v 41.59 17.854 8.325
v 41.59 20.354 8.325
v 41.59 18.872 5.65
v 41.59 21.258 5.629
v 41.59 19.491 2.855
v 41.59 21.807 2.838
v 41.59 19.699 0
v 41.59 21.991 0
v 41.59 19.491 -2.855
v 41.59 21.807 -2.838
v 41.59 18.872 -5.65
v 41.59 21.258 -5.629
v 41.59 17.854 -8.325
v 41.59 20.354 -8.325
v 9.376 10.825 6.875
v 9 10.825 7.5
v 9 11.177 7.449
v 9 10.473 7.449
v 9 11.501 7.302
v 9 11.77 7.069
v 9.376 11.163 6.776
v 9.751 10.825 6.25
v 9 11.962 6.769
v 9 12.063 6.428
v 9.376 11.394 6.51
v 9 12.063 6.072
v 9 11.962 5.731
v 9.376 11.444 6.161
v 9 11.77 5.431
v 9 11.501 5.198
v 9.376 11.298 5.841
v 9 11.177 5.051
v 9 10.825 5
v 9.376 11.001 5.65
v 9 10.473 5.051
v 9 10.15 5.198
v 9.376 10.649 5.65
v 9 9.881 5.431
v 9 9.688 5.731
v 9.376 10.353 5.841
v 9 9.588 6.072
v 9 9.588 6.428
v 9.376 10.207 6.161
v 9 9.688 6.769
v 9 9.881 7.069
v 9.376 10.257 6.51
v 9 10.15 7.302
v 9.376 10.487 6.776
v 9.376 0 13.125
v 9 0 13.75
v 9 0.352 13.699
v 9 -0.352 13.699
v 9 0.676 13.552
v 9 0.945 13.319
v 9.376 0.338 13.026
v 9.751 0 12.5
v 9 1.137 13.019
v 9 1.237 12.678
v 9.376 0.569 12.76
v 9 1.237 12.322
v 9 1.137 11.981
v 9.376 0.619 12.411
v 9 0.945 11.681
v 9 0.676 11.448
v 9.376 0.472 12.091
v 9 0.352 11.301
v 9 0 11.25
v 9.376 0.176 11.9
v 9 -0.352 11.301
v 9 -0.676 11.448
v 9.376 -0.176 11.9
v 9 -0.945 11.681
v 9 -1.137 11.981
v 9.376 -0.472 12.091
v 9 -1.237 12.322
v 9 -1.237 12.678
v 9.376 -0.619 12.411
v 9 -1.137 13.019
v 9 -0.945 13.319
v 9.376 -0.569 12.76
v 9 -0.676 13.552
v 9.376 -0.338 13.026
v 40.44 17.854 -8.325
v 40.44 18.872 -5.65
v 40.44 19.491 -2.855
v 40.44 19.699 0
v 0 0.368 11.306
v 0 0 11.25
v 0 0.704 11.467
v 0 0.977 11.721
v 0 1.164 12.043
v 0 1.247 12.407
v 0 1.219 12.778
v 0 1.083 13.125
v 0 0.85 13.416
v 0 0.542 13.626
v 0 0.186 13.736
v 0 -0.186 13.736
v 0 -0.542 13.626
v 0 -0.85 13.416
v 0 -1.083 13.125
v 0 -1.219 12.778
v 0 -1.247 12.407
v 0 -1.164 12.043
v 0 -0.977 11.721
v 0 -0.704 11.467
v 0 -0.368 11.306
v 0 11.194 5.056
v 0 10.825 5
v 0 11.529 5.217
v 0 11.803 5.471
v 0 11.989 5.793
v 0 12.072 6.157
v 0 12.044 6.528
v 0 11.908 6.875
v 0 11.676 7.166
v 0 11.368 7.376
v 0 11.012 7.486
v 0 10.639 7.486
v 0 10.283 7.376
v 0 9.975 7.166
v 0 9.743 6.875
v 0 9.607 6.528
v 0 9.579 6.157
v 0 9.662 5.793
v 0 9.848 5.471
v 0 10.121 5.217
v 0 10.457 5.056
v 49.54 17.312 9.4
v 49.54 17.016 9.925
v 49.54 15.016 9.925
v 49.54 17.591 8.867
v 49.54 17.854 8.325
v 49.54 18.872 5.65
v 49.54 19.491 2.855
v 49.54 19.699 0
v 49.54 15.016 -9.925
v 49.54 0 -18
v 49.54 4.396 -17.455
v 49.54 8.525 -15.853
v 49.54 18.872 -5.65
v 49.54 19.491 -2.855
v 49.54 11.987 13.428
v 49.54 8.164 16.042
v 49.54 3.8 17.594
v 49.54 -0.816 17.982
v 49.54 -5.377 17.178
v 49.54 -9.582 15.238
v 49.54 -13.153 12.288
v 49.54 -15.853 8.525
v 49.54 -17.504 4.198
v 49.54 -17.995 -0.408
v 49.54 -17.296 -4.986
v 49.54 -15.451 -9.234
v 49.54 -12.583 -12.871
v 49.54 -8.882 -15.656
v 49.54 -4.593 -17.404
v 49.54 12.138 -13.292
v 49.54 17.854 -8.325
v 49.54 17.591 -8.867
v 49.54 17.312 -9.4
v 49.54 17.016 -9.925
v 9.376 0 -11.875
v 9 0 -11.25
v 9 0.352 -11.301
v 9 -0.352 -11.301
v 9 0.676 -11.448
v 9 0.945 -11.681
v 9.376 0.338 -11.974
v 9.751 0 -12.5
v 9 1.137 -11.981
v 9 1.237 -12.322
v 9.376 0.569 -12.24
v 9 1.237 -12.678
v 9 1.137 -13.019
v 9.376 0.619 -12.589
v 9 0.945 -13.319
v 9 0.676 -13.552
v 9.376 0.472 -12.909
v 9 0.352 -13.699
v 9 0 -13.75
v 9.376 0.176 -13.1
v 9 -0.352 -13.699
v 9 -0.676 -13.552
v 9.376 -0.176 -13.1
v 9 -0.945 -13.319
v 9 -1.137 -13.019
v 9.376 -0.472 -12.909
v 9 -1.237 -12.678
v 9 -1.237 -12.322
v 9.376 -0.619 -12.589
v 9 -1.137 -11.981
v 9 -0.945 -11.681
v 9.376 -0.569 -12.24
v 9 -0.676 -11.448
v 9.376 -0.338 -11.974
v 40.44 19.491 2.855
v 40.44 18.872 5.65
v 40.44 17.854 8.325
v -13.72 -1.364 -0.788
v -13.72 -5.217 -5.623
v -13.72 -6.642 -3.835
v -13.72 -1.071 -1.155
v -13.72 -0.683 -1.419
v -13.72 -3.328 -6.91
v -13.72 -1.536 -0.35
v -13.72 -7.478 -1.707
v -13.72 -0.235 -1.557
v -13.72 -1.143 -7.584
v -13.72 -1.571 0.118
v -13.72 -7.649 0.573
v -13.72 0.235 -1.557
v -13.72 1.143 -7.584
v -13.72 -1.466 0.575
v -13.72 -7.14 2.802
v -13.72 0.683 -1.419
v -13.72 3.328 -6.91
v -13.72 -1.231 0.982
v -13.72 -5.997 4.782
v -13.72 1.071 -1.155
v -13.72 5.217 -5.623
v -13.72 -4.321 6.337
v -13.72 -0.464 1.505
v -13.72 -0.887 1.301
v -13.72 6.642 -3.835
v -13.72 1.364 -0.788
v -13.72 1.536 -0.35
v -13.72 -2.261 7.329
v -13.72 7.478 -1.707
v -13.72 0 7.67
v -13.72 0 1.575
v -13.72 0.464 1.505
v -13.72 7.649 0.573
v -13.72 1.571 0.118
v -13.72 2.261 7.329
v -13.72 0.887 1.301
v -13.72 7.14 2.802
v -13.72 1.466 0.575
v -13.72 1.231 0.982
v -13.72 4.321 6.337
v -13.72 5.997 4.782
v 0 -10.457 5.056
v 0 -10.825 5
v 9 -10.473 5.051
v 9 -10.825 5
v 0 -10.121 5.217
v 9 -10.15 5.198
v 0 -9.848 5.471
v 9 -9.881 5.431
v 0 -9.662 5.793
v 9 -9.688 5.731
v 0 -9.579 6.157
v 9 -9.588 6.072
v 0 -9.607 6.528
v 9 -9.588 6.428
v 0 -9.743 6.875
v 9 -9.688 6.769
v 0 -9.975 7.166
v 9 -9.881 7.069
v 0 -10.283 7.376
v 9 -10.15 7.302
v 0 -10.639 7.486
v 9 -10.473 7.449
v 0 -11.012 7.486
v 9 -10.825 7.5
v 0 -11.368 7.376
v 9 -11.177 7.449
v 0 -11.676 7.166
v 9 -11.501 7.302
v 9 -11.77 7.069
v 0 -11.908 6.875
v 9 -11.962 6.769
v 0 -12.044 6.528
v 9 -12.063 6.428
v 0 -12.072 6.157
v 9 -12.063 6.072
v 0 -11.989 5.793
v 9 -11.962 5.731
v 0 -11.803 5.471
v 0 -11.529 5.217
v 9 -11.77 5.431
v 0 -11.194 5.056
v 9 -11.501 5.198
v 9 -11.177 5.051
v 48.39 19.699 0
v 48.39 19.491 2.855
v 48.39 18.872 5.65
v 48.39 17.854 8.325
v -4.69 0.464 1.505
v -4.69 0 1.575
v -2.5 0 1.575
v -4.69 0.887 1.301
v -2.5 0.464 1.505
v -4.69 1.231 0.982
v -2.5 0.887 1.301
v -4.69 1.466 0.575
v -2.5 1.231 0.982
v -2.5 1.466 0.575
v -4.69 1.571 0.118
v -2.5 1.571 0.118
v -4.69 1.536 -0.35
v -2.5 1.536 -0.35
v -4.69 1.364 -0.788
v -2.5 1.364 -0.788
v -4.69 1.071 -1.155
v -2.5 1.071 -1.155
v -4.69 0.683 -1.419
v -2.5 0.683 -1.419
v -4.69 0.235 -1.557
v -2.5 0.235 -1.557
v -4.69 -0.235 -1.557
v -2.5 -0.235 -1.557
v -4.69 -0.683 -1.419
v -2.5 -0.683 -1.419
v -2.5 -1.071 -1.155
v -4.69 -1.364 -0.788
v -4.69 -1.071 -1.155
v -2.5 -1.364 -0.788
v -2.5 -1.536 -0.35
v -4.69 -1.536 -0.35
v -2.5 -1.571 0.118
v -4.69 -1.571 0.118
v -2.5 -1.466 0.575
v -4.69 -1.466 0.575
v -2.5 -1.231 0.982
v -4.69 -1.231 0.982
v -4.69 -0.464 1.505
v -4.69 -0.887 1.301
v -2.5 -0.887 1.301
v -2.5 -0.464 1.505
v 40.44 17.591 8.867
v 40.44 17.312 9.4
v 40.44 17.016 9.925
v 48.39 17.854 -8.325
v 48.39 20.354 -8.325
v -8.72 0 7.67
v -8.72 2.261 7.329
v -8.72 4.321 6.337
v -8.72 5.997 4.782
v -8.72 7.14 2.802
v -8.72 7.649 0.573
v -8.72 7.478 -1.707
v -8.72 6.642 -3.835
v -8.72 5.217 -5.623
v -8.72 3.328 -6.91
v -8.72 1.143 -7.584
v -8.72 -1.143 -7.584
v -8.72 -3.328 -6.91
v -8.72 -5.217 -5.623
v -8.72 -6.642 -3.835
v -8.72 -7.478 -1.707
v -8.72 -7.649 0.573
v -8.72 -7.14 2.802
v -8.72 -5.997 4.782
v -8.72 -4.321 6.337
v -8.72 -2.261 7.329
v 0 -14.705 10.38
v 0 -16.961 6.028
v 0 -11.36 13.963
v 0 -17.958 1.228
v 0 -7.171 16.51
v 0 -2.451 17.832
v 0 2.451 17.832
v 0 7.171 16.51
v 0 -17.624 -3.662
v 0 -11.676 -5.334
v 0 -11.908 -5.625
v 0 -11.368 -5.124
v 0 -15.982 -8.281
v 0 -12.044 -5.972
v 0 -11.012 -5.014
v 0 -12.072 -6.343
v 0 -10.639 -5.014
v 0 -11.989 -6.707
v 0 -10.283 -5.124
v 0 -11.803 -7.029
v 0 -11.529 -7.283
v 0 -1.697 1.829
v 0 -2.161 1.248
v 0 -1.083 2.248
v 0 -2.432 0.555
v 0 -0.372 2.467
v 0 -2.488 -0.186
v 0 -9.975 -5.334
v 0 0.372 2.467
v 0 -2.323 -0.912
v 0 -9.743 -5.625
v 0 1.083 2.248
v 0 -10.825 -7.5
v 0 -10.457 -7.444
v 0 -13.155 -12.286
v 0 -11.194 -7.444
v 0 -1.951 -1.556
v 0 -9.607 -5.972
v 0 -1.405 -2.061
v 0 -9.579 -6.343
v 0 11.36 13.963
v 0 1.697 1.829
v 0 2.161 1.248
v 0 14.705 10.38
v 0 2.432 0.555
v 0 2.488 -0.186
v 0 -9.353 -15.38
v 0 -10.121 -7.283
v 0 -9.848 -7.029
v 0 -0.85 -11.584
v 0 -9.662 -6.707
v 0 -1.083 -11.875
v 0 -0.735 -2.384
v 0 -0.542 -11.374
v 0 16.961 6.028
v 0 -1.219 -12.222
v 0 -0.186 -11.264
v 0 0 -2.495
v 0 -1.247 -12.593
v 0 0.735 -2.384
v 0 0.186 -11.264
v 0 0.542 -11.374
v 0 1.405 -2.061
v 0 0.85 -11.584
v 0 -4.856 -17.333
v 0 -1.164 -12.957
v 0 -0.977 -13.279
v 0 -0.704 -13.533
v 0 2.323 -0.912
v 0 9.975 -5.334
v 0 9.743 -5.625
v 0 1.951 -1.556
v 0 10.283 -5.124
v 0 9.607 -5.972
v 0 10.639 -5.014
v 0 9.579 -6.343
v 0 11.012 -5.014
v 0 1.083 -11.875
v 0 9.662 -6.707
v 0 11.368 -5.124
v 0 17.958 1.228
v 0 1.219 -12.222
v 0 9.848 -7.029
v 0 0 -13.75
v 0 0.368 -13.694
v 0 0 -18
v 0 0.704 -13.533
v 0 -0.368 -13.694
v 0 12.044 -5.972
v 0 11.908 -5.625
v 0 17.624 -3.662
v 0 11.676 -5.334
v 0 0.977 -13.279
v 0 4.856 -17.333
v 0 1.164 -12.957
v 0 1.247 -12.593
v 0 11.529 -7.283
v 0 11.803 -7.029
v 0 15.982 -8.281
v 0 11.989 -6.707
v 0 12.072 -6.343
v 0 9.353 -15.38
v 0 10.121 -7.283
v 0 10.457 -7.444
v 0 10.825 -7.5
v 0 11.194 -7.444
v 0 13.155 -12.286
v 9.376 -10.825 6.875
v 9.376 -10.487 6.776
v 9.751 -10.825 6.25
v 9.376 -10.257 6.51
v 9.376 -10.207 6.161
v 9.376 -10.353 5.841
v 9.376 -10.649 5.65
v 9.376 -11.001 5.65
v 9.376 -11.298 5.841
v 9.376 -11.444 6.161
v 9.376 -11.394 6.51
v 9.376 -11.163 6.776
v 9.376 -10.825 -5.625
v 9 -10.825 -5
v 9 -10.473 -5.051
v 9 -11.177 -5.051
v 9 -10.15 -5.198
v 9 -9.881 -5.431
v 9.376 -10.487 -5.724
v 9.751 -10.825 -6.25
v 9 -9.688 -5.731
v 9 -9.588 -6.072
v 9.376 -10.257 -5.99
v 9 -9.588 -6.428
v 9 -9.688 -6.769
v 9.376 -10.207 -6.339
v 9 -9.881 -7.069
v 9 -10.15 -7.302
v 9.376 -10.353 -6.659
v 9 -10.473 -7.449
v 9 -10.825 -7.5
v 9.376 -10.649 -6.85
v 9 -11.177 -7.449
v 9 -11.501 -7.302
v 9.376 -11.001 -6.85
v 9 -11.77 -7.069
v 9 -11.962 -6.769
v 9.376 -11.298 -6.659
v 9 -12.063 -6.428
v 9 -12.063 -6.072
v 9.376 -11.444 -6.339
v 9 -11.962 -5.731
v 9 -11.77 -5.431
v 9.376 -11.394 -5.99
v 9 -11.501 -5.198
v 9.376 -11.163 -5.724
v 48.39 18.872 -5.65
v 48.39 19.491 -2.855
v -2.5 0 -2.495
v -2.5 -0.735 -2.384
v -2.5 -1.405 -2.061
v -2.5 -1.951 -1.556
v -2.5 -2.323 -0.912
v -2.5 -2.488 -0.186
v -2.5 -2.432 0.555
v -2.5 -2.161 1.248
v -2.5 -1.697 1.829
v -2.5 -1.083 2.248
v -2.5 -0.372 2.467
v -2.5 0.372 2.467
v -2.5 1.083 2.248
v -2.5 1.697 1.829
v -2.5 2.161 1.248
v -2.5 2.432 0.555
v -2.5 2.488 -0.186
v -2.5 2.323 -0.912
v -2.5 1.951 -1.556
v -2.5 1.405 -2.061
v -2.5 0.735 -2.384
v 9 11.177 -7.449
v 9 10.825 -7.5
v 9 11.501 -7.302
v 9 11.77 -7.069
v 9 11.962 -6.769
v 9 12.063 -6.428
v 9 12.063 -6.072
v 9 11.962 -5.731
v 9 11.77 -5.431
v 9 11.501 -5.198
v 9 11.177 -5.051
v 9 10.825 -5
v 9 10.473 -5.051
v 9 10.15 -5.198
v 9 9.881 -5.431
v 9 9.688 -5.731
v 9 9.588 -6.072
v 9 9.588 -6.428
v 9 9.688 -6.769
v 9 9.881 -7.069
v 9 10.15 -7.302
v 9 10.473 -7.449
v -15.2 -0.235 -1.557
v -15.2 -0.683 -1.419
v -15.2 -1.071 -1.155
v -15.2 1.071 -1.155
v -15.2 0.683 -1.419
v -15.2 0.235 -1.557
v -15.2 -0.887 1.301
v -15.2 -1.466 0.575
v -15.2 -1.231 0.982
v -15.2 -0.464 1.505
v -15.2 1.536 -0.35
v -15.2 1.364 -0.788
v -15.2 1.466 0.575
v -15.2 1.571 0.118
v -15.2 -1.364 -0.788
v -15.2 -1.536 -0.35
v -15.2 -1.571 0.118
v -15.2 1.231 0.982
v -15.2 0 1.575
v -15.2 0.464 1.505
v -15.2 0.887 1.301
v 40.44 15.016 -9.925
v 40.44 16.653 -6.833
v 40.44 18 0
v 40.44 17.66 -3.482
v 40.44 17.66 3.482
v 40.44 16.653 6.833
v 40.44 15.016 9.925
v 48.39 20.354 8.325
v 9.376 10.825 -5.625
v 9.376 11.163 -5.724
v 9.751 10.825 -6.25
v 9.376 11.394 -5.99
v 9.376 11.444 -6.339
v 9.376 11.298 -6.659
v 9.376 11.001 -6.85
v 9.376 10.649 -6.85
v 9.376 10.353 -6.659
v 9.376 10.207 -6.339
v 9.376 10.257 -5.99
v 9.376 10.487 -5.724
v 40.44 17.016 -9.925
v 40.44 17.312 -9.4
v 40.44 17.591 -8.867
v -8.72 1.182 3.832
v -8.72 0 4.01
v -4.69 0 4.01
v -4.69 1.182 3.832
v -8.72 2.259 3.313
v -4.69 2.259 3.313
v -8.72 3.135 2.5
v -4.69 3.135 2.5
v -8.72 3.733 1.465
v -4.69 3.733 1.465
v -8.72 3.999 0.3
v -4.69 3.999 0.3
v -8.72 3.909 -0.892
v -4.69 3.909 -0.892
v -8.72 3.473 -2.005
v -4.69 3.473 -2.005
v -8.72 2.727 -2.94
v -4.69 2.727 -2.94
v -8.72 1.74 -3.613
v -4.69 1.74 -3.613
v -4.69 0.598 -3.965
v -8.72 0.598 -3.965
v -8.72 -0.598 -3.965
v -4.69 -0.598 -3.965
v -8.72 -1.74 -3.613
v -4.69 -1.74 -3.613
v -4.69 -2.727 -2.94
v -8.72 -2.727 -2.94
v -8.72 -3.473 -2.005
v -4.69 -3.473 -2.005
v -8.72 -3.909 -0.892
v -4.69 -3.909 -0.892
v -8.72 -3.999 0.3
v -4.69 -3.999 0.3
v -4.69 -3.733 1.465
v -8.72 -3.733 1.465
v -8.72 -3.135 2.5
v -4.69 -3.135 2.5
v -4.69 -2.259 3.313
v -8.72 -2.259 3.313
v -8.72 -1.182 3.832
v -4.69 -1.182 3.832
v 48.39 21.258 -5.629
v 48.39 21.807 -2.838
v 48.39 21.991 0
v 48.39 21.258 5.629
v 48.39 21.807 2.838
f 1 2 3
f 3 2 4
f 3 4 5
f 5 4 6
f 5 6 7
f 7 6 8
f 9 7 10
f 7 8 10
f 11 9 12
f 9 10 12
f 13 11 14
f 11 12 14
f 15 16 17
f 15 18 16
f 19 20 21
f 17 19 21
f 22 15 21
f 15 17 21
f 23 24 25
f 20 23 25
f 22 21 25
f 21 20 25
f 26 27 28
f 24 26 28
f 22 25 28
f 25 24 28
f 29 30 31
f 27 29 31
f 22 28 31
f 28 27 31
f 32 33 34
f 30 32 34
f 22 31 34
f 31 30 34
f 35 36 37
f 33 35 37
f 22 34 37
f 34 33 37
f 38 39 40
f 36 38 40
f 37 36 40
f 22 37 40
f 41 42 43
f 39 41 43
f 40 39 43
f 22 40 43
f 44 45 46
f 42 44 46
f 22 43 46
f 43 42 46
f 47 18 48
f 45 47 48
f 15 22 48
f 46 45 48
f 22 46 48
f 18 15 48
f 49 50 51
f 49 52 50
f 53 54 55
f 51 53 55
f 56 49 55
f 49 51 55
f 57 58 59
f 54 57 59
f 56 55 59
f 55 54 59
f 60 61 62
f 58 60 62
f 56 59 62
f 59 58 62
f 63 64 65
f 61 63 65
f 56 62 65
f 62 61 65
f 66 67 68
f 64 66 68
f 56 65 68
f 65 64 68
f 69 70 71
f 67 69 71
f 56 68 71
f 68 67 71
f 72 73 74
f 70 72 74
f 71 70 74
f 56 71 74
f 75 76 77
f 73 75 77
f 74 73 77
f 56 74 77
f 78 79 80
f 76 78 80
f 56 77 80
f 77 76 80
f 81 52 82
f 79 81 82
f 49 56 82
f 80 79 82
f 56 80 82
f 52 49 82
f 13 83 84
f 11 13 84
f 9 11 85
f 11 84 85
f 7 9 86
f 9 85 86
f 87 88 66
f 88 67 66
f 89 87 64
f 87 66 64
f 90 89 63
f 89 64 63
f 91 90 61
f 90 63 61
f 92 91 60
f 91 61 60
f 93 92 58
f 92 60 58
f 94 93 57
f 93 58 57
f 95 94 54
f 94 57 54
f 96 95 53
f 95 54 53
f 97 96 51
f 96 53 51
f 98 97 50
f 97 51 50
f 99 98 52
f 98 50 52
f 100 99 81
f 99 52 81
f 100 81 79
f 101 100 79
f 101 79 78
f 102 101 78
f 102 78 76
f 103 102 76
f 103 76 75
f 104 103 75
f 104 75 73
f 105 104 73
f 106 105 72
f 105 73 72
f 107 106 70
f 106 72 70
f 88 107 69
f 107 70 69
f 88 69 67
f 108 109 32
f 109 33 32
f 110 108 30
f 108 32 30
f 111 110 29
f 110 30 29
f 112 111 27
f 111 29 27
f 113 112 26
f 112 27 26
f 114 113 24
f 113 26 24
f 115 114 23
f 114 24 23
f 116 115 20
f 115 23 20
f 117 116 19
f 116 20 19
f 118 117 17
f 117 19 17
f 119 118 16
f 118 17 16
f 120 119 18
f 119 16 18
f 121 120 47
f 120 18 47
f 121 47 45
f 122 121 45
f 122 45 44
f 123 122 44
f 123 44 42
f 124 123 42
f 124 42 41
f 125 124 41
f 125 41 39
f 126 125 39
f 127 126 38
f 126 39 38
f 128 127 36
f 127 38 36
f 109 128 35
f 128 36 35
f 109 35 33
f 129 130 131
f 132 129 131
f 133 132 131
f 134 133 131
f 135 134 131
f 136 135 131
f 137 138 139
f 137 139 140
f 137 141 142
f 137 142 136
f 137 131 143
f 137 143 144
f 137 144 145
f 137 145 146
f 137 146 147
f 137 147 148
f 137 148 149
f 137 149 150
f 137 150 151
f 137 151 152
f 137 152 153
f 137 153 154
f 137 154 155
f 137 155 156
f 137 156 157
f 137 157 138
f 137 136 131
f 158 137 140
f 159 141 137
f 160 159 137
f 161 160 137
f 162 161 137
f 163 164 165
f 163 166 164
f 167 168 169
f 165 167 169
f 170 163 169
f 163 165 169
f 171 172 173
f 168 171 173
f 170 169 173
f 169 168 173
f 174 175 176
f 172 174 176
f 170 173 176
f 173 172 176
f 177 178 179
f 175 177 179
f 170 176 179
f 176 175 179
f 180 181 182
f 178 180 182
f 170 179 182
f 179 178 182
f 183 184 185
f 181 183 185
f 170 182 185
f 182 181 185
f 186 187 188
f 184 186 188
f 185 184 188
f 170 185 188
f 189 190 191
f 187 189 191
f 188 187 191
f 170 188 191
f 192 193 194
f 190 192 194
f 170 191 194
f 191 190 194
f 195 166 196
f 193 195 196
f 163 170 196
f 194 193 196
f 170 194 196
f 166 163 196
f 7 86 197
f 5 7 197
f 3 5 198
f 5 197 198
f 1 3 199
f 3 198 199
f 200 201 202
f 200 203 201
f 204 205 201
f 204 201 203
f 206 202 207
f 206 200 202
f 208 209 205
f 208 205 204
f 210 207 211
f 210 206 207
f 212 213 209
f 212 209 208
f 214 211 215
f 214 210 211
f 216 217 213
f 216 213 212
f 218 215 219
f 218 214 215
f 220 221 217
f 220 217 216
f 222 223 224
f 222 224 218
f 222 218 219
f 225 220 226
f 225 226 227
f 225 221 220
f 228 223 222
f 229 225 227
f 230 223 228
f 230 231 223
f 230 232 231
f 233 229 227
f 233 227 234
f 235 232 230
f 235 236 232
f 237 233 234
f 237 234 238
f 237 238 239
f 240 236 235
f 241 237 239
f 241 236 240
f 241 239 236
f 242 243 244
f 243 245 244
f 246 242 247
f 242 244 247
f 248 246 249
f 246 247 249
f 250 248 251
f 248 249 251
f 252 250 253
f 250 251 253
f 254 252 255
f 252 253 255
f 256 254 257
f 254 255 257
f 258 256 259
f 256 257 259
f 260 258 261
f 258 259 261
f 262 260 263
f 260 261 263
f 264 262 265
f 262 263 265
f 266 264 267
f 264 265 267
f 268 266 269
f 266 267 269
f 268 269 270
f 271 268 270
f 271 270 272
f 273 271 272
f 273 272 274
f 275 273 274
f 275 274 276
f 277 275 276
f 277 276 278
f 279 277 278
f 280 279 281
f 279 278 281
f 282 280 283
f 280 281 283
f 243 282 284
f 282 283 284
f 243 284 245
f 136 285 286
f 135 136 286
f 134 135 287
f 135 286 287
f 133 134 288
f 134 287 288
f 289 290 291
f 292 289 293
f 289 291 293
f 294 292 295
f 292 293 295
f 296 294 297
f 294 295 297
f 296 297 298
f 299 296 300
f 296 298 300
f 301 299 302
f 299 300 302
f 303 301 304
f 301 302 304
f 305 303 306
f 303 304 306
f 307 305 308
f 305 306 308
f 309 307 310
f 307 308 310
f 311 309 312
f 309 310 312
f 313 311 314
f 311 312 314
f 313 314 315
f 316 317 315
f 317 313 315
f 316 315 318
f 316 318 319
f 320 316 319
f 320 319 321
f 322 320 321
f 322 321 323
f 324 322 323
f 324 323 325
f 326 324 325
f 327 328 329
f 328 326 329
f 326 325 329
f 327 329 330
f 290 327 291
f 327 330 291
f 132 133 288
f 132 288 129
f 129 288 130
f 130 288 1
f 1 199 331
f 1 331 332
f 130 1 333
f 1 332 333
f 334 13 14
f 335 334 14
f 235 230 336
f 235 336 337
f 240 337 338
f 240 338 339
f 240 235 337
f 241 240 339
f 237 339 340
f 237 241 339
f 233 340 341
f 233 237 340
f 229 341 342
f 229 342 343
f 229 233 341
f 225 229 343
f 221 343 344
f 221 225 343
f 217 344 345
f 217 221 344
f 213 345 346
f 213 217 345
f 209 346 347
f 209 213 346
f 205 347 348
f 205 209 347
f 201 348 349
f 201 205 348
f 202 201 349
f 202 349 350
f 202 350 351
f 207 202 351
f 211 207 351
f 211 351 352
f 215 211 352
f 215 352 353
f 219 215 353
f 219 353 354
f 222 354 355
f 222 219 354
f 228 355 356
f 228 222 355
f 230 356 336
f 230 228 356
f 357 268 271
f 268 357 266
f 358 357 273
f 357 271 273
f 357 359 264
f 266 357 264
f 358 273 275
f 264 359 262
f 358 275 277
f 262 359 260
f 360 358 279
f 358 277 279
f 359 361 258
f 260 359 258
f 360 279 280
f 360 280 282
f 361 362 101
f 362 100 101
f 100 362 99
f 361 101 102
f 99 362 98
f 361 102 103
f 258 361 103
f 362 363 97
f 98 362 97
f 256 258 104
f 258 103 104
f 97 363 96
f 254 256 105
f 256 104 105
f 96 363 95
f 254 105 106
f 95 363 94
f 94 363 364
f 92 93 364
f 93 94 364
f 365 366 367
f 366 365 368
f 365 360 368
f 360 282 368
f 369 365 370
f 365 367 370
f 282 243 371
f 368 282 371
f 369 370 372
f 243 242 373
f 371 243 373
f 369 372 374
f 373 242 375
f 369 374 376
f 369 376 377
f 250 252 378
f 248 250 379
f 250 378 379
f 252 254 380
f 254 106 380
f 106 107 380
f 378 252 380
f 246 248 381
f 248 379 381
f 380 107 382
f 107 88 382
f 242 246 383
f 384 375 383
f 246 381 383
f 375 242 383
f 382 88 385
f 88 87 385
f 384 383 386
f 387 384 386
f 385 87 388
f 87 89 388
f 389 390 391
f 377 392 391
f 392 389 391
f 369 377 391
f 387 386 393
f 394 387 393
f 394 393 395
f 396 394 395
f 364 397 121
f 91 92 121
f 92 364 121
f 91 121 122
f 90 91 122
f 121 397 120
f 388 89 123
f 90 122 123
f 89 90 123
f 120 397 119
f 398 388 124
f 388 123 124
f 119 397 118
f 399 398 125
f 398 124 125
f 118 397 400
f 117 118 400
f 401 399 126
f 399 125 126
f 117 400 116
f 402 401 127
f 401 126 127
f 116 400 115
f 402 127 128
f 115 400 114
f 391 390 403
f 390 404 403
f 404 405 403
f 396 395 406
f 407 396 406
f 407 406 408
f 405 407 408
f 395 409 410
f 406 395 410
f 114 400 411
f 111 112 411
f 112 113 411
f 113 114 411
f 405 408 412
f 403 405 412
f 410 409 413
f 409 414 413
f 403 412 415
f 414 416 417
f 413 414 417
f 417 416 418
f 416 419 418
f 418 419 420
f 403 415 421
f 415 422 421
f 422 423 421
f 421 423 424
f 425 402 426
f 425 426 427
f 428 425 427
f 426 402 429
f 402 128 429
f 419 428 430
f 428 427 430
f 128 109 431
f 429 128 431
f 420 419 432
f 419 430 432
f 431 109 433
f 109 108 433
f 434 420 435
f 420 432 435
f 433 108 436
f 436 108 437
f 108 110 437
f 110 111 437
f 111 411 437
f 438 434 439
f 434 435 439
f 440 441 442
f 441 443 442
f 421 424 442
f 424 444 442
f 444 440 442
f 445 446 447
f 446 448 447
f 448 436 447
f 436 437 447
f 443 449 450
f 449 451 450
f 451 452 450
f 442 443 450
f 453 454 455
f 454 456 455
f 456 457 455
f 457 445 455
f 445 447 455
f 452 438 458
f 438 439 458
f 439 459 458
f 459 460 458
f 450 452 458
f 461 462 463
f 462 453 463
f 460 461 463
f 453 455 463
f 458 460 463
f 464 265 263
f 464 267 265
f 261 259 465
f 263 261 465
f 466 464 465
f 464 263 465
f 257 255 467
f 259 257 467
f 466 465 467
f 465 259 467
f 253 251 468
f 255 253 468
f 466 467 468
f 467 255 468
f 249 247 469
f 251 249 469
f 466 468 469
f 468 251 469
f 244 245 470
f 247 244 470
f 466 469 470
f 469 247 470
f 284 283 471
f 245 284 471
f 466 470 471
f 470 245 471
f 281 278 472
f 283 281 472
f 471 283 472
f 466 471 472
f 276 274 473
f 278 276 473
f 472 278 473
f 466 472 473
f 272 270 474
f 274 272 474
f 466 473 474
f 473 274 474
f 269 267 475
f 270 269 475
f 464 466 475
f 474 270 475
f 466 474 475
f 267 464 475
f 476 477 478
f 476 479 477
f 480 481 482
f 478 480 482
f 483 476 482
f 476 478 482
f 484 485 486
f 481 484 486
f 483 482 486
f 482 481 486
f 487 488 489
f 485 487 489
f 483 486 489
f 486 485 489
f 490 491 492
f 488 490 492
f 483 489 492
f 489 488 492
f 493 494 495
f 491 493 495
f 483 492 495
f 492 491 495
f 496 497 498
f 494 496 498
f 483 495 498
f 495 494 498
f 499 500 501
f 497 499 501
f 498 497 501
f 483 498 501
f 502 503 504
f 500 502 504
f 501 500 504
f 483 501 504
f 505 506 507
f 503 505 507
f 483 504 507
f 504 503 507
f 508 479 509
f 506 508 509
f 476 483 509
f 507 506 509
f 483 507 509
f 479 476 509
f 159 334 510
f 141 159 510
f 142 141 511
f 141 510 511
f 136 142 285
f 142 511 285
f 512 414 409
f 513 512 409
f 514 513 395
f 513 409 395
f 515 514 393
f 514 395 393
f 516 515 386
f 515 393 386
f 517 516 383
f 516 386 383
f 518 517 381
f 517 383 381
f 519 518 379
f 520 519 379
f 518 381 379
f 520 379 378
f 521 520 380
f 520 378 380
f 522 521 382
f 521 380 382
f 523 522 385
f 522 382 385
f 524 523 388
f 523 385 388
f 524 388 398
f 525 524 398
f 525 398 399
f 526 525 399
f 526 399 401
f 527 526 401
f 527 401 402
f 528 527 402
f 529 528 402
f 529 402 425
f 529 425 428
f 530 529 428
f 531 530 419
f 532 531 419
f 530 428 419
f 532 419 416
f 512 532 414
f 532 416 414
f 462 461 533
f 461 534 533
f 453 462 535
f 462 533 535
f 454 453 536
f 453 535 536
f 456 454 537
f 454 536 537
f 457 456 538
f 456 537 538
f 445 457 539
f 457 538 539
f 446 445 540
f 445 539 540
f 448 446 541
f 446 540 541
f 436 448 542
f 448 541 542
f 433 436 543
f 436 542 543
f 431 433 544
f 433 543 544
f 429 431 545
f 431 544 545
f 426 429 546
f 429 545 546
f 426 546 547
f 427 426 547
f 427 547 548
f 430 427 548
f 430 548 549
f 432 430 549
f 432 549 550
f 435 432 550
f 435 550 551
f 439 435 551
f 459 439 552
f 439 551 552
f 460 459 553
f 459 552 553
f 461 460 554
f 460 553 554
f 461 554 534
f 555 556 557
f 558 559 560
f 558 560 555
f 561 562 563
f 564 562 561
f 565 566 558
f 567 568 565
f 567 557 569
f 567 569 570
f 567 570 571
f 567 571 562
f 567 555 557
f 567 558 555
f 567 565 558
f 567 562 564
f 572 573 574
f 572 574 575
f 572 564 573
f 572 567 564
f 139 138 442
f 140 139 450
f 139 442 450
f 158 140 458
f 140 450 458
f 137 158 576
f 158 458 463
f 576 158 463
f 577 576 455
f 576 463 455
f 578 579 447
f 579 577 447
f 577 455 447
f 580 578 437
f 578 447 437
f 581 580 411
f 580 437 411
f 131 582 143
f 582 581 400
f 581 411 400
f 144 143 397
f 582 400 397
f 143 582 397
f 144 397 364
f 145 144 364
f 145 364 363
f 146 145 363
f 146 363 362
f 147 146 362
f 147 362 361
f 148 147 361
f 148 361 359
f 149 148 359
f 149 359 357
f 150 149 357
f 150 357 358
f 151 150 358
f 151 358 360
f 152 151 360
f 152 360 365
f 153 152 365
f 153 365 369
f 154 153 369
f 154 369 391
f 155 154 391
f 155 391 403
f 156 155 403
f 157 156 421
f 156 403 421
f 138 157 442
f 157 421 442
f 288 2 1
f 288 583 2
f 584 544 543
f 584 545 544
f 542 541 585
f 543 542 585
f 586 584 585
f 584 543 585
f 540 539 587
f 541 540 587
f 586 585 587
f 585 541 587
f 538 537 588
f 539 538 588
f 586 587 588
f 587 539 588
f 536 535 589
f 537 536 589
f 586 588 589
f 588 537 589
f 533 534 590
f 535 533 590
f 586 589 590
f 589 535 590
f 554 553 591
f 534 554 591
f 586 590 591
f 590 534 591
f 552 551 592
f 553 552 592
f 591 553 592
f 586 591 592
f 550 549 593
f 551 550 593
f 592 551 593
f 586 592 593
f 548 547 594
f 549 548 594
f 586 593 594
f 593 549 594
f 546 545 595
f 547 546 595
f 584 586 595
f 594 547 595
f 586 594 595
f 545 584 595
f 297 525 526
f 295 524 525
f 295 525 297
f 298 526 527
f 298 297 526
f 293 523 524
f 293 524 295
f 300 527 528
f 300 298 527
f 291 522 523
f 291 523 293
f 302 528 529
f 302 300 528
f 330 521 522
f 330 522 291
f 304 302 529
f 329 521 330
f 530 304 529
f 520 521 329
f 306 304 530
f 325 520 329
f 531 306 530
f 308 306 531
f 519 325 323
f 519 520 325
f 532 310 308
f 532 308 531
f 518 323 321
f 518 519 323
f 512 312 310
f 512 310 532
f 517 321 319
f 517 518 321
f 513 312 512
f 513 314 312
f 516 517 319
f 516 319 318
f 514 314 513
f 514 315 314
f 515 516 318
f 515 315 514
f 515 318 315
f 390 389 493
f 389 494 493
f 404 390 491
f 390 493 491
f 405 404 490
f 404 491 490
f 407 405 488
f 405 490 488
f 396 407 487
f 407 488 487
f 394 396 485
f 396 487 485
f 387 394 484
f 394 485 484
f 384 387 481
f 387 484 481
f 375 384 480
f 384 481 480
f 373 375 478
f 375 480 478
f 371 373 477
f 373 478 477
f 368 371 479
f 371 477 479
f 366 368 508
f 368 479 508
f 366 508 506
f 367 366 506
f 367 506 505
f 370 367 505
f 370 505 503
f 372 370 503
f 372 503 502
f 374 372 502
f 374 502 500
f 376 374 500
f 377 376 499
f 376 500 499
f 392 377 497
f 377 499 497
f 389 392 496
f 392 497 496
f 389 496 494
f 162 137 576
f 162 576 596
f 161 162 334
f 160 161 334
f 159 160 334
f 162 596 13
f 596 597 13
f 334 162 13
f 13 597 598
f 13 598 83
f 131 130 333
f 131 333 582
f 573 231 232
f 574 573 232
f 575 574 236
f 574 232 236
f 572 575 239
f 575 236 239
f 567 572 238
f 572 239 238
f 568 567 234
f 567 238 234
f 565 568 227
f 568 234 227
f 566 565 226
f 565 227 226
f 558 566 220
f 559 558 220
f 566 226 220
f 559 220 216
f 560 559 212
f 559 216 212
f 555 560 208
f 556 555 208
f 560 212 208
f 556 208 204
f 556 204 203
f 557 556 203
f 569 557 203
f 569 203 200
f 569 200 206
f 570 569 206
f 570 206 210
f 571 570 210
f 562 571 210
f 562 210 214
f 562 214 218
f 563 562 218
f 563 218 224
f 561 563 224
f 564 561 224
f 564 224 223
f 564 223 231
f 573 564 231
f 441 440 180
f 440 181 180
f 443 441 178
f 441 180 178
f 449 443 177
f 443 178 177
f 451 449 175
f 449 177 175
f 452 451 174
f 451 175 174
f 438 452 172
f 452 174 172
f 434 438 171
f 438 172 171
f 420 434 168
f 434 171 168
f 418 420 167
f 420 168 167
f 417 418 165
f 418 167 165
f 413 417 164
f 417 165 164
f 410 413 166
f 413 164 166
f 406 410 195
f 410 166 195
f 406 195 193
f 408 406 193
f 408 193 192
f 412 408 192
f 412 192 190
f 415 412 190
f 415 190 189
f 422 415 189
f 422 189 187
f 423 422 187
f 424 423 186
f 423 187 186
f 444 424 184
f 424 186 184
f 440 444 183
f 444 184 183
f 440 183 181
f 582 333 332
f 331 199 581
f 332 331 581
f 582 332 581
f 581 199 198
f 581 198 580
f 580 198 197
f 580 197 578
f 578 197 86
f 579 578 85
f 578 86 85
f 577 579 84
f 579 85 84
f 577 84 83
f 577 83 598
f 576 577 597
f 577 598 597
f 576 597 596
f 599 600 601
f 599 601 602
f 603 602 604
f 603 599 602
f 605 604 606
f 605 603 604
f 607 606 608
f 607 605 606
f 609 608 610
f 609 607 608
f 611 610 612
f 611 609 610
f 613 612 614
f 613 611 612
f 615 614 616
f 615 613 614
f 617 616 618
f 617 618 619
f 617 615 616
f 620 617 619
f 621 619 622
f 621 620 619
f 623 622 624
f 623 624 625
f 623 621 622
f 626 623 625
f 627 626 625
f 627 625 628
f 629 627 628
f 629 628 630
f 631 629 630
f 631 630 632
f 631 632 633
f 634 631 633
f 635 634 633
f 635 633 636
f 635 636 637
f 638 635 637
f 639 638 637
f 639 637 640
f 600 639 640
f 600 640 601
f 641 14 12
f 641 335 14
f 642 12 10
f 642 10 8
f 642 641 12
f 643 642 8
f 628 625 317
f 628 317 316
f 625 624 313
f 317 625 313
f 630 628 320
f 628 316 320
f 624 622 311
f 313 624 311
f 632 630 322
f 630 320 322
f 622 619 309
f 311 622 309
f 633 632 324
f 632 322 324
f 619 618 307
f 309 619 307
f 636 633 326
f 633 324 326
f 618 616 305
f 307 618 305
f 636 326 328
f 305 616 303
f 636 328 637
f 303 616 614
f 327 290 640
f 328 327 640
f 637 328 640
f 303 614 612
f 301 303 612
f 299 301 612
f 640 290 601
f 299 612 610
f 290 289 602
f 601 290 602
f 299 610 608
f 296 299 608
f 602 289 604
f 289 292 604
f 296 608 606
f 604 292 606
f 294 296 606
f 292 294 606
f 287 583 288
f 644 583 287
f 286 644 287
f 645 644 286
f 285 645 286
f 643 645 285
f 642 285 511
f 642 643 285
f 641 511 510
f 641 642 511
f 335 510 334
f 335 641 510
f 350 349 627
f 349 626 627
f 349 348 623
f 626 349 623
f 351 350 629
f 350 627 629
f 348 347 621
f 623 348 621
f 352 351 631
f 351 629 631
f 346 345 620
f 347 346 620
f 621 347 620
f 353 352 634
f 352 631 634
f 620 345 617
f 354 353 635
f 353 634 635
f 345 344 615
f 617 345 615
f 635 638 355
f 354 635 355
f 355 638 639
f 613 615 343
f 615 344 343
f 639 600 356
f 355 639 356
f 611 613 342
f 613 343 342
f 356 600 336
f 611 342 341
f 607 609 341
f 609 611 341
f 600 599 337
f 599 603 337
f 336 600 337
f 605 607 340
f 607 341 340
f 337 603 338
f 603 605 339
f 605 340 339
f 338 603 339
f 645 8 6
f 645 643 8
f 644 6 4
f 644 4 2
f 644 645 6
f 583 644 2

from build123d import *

# Parameters (mm, degrees)
SCHIZZO1_R                    = 18
ESTRUSIONE_ESTRUSIONE1_DEPTH  = 49.54
SCHIZZO2_R                    = 2.495
ESTRUSIONE_ESTRUSIONE2_DEPTH  = 2.5
SCHIZZO3_R                    = 1.575
ESTRUSIONE_ESTRUSIONE3_DEPTH  = 12.7
SCHIZZO4_R                    = 7.67
ESTRUSIONE_ESTRUSIONE4_DEPTH  = 5
SCHIZZO5_R                    = 4.01
ESTRUSIONE_ESTRUSIONE5_DEPTH  = 9.03
FORO_FILETTATO_M3X0_5_1_D     = 2.5
FORO_FILETTATO_M3X0_5_1_DEPTH = 9
FORO_FILETTATO_M3X0_5_1_TIP   = 0.751075774
ESTRUSIONE_ESTRUSIONE6_START  = -9.1
ESTRUSIONE_ESTRUSIONE6_DEPTH  = 9.1
ESTRUSIONE_ESTRUSIONE7_START  = -4.55
ESTRUSIONE_ESTRUSIONE7_DEPTH  = 3.4


with BuildPart() as part:
    # Schizzo1 → Estrusione-Estrusione1 (new body)
    with BuildSketch(Plane(origin=(0, 0, 0), x_dir=(0, 0, -1), z_dir=(1, 0, 0))):
        Circle(SCHIZZO1_R)
    extrude(amount=ESTRUSIONE_ESTRUSIONE1_DEPTH)

    # Schizzo2 → Estrusione-Estrusione2 (add)
    with BuildSketch(Plane.ZY):
        with Locations(Location((0, 0, 0), (0, 0, 180))):
            Circle(SCHIZZO2_R)
    extrude(amount=ESTRUSIONE_ESTRUSIONE2_DEPTH)

    # Schizzo3 → Estrusione-Estrusione3 (add)
    with BuildSketch(Plane.ZY.offset(2.5)):
        Circle(SCHIZZO3_R)
    extrude(amount=ESTRUSIONE_ESTRUSIONE3_DEPTH)

    # Schizzo4 → Estrusione-Estrusione4 (add)
    with BuildSketch(Plane.ZY.offset(13.72)):
        Circle(SCHIZZO4_R)
    extrude(amount=-ESTRUSIONE_ESTRUSIONE4_DEPTH)

    # Schizzo5 → Estrusione-Estrusione5 (add)
    with BuildSketch(Plane.ZY.offset(13.72)):
        Circle(SCHIZZO5_R)
    extrude(amount=-ESTRUSIONE_ESTRUSIONE5_DEPTH)

    # Foro filettato M3x0.5-1
    with Locations(Plane.ZY):
        with Locations((12.5, 0), (6.25, -10.825317547), (-6.25, -10.825317547), (-12.5, 0), (-6.25, 10.825317547), (6.25, 10.825317547)):
            Hole(FORO_FILETTATO_M3X0_5_1_D / 2, depth=FORO_FILETTATO_M3X0_5_1_DEPTH)
            with Locations((0, 0, -(FORO_FILETTATO_M3X0_5_1_DEPTH + FORO_FILETTATO_M3X0_5_1_TIP / 2))):  # 118° drill point
                Cone(0, FORO_FILETTATO_M3X0_5_1_D / 2, FORO_FILETTATO_M3X0_5_1_TIP, mode=Mode.SUBTRACT)

    # Schizzo10 → Estrusione-Estrusione6 (add)
    with BuildSketch(Plane(origin=(49.54, 0, 0), x_dir=(0, 0, -1), z_dir=(1, 0, 0)).offset(ESTRUSIONE_ESTRUSIONE6_START)):
        with BuildLine():
            ThreePointArc((-9.925, 15.016470124), (-5.181869246, 17.237988024), (0, 18))
            Line((0, 18), (0, 19.69938782))
            ThreePointArc((0, 19.69938782), (-4.26355498, 19.232472005), (-8.325, 17.85385828))
            ThreePointArc((-8.325, 17.85385828), (-9.134600688, 17.453508265), (-9.925, 17.016470124))
            Line((-9.925, 17.016470124), (-9.925, 15.016470124))
        make_face()
        with BuildLine():
            Line((0, 19.69938782), (0, 18))
            ThreePointArc((0, 18), (5.181869246, 17.237988024), (9.925, 15.016470124))
            Line((9.925, 15.016470124), (9.925, 17.016470124))
            ThreePointArc((9.925, 17.016470124), (9.134600688, 17.453508265), (8.325, 17.85385828))
            ThreePointArc((8.325, 17.85385828), (4.26355498, 19.232472005), (0, 19.69938782))
        make_face()
    extrude(amount=ESTRUSIONE_ESTRUSIONE6_DEPTH)

    # Schizzo10<4> → Estrusione-Estrusione7 (add, symmetric)
    with BuildSketch(Plane(origin=(49.54, 0, 0), x_dir=(0, 0, -1), z_dir=(1, 0, 0)).offset(ESTRUSIONE_ESTRUSIONE7_START)):
        with BuildLine():
            ThreePointArc((-8.325, 17.85385828), (-4.26355498, 19.232472005), (0, 19.69938782))
            Line((0, 19.69938782), (0, 21.990570068))
            ThreePointArc((0, 21.990570068), (-4.24218253, 21.577512815), (-8.325, 20.35385828))
            Line((-8.325, 20.35385828), (-8.325, 17.85385828))
        make_face()
        with BuildLine():
            Line((0, 21.990570068), (0, 19.69938782))
            ThreePointArc((0, 19.69938782), (4.26355498, 19.232472005), (8.325, 17.85385828))
            Line((8.325, 17.85385828), (8.325, 20.35385828))
            ThreePointArc((8.325, 20.35385828), (4.24218253, 21.577512815), (0, 21.990570068))
        make_face()
    extrude(amount=ESTRUSIONE_ESTRUSIONE7_DEPTH, both=True)


solid = part.part
